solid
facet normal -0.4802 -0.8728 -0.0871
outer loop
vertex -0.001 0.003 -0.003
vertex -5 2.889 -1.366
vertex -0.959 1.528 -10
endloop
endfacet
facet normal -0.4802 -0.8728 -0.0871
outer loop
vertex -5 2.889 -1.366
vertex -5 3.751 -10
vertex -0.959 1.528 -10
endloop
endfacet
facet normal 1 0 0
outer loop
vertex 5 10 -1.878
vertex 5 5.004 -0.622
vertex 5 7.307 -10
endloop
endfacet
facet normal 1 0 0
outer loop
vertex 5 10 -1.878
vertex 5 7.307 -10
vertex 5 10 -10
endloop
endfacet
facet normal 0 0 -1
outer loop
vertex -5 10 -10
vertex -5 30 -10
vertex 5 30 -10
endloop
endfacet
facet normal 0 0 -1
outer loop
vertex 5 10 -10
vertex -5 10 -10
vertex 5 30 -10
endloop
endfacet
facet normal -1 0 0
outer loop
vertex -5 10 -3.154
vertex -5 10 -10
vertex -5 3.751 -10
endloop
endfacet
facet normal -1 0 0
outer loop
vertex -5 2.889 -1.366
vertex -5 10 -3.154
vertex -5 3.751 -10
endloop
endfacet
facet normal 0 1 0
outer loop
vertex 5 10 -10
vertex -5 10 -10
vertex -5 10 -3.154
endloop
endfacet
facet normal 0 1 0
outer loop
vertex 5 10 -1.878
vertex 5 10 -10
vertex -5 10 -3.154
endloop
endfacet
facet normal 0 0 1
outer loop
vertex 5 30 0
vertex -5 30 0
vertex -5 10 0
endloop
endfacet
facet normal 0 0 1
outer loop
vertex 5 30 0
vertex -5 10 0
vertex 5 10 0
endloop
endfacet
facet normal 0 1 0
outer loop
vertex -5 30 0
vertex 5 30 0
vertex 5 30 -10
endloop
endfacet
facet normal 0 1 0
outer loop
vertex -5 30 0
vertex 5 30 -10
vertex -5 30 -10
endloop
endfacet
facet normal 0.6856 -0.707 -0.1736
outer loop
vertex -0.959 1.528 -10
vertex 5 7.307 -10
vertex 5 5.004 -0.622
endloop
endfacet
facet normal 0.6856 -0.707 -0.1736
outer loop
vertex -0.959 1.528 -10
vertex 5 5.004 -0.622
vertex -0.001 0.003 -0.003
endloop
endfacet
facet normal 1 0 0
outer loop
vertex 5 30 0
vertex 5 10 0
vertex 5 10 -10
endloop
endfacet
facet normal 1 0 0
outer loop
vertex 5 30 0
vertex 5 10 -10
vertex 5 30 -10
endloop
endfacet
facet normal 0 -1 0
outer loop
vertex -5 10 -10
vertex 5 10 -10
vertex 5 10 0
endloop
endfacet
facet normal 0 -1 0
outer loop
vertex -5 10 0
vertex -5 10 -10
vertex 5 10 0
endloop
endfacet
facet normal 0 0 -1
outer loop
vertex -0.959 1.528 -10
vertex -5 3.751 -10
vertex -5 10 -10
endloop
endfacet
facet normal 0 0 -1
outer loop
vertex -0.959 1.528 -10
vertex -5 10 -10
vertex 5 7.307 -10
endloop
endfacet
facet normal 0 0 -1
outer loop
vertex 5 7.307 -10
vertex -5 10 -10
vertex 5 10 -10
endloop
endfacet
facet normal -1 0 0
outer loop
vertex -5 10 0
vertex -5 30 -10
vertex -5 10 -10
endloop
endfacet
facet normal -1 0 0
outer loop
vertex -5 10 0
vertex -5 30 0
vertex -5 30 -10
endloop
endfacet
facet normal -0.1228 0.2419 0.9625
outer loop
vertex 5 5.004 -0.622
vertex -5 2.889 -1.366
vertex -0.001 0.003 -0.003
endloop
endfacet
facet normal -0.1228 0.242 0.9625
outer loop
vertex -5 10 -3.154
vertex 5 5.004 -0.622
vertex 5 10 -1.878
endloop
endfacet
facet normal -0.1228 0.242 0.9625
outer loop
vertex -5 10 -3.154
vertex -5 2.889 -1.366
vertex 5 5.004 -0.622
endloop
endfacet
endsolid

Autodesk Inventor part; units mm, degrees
sketch "草图1" plane through (0, 0, 0) normal (0, 0, 1) x (1, 0, 0)
  line L0 (0, 0) -> (5, 0)
  line L1 (5, 5) -> (5, 30)
  line L2 (5, 30) -> (-5, 30)
  line L3 (-5, 30) -> (-5, 2.8868)
  line L4 (-5, 0) -> (5, 0)
  line L5 (0, 0) -> (5, 5)
  line L6 (0, 0) -> (7.0711, 0) construction
  line L7 (0, 0) -> (-5, 2.8868)
  line L8 (0, 0) -> (5.7735, 0) construction
  dimension "d0" = 5
  dimension "d1" = 30
  dimension "d2" = 10
  dimension "d5" = 45
  dimension "d6" = 150
extrude "拉伸1" add sketch "草图1" against normal blind 10
sketch "草图2" plane through (0, 0, 0) normal (0.7071068, -0.7071068, 0) x (-0.7071068, -0.7071068, 0)
  line L0 (0, 0) -> (-7.0711, 0) projected
  line L1 (0, 0) -> (-7.0713, 0.6187)
  line L2 (0, 0) -> (7.0983, 0) construction
  dimension "d7" = 175
ref_plane "工作平面4" through (-5, 10, 0) normal (0, 1, 0) x (1, 0, 0)
split body "分割1" result two bodies by plane through (-5, 10, 0) normal (0, 1, 0) first body at (1.6667, 16.6667, -0.5)
sketch3d "三维草图1"
ref_plane "副正交平面" through (0, 0, 0) normal (0.8660254, -0.5, 0) x (0.5, 0.8660254, 0)
sketch "草图4" plane through (5, 5, 0) normal (1, 0, 0) x (0, 0, -1)
  line L0 (0, 0) -> (10, 0) projected
  line L1 (0.6208, 0) -> (0.6208, 25)
  line L2 (0, 25) -> (10, 25) projected
  point P0 (0, -5)
sketch "草图5" plane through (-5, 30, 0) normal (0, 1, 0) x (1, 0, 0)
  line L0 (5, 0) -> (10, 0.619)
  line L1 (10, 0) -> (10, 10) projected
  line L2 (10, 0) -> (0, 0) projected
  line L3 (5, 0) -> (10, 0)
  line L4 (10, 0) -> (10, 0.619)
extrude "拉伸2" cut sketch "草图5" against normal blind 30 bodies 3
ref_plane "正交平面2" through (0, 0, 0) normal (-0.7071068, -0.7071068, 0) x (0, 0, -1)
ref_plane "正交平面" through (5, 5, 0) normal (-0.7071068, -0.7071068, 0) x (0, 0, -1)
sketch "草图6" plane through (0, 0, 0) normal (-0.7071068, -0.7071068, 0) x (0, 0, -1)
  line L0 (0, 0) -> (0, -21.2132) projected
  line L1 (0, 0) -> (2.4419, -9.1132)
  line L2 (0, 0) -> (9.4347, 0) construction
  line L3 (0, -24.7487) -> (0, -5.5768) projected
  line L4 (0, -5.5768) -> (0, 0) projected
  line L5 (0, 0) -> (10.9149, -1.9246)
  line L6 (0, 0) -> (11.0833, 0) construction
  dimension "d11" = 75
  dimension "d18" = 10
sketch "草图7" plane through (-5, 2.8868, 0) normal (-1, 0, 0) x (0, 0, 1)
  point P0 (0, -2.8868)
ref_plane "工作平面3" through (0, 0, 0) normal (-0.122781, 0.2419428, 0.9624908) x (0.7044127, 0.7044127, -0.0872102)
sketch "草图8" plane through (0, 0, 0) normal (-0.122781, 0.2419428, 0.9624908) x (0.7044127, 0.7044127, -0.0872102)
  line L0 (0, 0) -> (7.0441, 6.6728) projected
  line L1 (0, 0) -> (15, 0)
  line L2 (15, 0) -> (15, 15)
  line L3 (15, 15) -> (-5, 15)
  line L4 (-5, 15) -> (-5, 0)
  line L5 (0, 0) -> (0.8721, 2.5692) projected
  line L6 (-5, 0) -> (0, 0)
  dimension "d13" = 15
  dimension "d14" = 15
  dimension "d15" = 20
extrude "拉伸3" cut sketch "草图8" along normal blind 30 bodies 3
ref_plane "工作平面5" through (0, 0, 0) normal (-0.3968015, -0.6444766, -0.6536042) x (0.6830127, -0.6830127, 0.258819)
ref_plane "工作平面6" through (5, 5, -0.619) normal (0.6855357, -0.7070319, -0.1736281) x (-0.7044127, -0.7044127, 0.0872102)
sketch "草图9" plane through (5, 5, -0.619) normal (0.6855357, -0.7070319, -0.1736281) x (-0.7044127, -0.7044127, 0.0872102)
  line L0 (-3.1536, -1.7614) -> (-3.9393, 13.0649)
  line L1 (-3.9393, 13.0649) -> (12.5056, 12.3251)
  line L2 (12.5056, 12.3251) -> (9.2397, -2.319)
  line L3 (9.2397, -2.319) -> (-3.1536, -1.7614)
  point P0 (7.0981, 0)
extrude "拉伸4" cut sketch "草图9" along normal blind 10 bodies 3
sketch "草图10" plane through (0, 0, 0) normal (0.8660254, -0.5, 0) x (0.5, 0.8660254, 0)
  line L0 (0, 0) -> (1.0379, -11.8633)
  line L1 (0, 0) -> (11.9087, 0) construction
  dimension "d21" = 85
ref_plane "工作平面8" through (-5, 2.8868, -1.3635) normal (0.4801704, 0.8728364, 0.0871373) x (0.8428408, -0.4866144, 0.2298387)
sketch "草图11" plane through (-5, 2.8868, -1.3635) normal (0.4801704, 0.8728364, 0.0871373) x (0.8428408, -0.4866144, 0.2298387)
  line L0 (-8.1584, -1.617) -> (10.6055, -5.6683)
  line L1 (10.6055, -5.6683) -> (13.6618, 13.1312)
  line L2 (13.6618, 13.1312) -> (-7.6964, 11.7807)
  line L3 (-7.6964, 11.7807) -> (-8.1584, -1.617)
  point P0 (5.9323, 0)
extrude "拉伸5" cut sketch "草图11" against normal blind 10 bodies 3
properties part number "主副偏角"
